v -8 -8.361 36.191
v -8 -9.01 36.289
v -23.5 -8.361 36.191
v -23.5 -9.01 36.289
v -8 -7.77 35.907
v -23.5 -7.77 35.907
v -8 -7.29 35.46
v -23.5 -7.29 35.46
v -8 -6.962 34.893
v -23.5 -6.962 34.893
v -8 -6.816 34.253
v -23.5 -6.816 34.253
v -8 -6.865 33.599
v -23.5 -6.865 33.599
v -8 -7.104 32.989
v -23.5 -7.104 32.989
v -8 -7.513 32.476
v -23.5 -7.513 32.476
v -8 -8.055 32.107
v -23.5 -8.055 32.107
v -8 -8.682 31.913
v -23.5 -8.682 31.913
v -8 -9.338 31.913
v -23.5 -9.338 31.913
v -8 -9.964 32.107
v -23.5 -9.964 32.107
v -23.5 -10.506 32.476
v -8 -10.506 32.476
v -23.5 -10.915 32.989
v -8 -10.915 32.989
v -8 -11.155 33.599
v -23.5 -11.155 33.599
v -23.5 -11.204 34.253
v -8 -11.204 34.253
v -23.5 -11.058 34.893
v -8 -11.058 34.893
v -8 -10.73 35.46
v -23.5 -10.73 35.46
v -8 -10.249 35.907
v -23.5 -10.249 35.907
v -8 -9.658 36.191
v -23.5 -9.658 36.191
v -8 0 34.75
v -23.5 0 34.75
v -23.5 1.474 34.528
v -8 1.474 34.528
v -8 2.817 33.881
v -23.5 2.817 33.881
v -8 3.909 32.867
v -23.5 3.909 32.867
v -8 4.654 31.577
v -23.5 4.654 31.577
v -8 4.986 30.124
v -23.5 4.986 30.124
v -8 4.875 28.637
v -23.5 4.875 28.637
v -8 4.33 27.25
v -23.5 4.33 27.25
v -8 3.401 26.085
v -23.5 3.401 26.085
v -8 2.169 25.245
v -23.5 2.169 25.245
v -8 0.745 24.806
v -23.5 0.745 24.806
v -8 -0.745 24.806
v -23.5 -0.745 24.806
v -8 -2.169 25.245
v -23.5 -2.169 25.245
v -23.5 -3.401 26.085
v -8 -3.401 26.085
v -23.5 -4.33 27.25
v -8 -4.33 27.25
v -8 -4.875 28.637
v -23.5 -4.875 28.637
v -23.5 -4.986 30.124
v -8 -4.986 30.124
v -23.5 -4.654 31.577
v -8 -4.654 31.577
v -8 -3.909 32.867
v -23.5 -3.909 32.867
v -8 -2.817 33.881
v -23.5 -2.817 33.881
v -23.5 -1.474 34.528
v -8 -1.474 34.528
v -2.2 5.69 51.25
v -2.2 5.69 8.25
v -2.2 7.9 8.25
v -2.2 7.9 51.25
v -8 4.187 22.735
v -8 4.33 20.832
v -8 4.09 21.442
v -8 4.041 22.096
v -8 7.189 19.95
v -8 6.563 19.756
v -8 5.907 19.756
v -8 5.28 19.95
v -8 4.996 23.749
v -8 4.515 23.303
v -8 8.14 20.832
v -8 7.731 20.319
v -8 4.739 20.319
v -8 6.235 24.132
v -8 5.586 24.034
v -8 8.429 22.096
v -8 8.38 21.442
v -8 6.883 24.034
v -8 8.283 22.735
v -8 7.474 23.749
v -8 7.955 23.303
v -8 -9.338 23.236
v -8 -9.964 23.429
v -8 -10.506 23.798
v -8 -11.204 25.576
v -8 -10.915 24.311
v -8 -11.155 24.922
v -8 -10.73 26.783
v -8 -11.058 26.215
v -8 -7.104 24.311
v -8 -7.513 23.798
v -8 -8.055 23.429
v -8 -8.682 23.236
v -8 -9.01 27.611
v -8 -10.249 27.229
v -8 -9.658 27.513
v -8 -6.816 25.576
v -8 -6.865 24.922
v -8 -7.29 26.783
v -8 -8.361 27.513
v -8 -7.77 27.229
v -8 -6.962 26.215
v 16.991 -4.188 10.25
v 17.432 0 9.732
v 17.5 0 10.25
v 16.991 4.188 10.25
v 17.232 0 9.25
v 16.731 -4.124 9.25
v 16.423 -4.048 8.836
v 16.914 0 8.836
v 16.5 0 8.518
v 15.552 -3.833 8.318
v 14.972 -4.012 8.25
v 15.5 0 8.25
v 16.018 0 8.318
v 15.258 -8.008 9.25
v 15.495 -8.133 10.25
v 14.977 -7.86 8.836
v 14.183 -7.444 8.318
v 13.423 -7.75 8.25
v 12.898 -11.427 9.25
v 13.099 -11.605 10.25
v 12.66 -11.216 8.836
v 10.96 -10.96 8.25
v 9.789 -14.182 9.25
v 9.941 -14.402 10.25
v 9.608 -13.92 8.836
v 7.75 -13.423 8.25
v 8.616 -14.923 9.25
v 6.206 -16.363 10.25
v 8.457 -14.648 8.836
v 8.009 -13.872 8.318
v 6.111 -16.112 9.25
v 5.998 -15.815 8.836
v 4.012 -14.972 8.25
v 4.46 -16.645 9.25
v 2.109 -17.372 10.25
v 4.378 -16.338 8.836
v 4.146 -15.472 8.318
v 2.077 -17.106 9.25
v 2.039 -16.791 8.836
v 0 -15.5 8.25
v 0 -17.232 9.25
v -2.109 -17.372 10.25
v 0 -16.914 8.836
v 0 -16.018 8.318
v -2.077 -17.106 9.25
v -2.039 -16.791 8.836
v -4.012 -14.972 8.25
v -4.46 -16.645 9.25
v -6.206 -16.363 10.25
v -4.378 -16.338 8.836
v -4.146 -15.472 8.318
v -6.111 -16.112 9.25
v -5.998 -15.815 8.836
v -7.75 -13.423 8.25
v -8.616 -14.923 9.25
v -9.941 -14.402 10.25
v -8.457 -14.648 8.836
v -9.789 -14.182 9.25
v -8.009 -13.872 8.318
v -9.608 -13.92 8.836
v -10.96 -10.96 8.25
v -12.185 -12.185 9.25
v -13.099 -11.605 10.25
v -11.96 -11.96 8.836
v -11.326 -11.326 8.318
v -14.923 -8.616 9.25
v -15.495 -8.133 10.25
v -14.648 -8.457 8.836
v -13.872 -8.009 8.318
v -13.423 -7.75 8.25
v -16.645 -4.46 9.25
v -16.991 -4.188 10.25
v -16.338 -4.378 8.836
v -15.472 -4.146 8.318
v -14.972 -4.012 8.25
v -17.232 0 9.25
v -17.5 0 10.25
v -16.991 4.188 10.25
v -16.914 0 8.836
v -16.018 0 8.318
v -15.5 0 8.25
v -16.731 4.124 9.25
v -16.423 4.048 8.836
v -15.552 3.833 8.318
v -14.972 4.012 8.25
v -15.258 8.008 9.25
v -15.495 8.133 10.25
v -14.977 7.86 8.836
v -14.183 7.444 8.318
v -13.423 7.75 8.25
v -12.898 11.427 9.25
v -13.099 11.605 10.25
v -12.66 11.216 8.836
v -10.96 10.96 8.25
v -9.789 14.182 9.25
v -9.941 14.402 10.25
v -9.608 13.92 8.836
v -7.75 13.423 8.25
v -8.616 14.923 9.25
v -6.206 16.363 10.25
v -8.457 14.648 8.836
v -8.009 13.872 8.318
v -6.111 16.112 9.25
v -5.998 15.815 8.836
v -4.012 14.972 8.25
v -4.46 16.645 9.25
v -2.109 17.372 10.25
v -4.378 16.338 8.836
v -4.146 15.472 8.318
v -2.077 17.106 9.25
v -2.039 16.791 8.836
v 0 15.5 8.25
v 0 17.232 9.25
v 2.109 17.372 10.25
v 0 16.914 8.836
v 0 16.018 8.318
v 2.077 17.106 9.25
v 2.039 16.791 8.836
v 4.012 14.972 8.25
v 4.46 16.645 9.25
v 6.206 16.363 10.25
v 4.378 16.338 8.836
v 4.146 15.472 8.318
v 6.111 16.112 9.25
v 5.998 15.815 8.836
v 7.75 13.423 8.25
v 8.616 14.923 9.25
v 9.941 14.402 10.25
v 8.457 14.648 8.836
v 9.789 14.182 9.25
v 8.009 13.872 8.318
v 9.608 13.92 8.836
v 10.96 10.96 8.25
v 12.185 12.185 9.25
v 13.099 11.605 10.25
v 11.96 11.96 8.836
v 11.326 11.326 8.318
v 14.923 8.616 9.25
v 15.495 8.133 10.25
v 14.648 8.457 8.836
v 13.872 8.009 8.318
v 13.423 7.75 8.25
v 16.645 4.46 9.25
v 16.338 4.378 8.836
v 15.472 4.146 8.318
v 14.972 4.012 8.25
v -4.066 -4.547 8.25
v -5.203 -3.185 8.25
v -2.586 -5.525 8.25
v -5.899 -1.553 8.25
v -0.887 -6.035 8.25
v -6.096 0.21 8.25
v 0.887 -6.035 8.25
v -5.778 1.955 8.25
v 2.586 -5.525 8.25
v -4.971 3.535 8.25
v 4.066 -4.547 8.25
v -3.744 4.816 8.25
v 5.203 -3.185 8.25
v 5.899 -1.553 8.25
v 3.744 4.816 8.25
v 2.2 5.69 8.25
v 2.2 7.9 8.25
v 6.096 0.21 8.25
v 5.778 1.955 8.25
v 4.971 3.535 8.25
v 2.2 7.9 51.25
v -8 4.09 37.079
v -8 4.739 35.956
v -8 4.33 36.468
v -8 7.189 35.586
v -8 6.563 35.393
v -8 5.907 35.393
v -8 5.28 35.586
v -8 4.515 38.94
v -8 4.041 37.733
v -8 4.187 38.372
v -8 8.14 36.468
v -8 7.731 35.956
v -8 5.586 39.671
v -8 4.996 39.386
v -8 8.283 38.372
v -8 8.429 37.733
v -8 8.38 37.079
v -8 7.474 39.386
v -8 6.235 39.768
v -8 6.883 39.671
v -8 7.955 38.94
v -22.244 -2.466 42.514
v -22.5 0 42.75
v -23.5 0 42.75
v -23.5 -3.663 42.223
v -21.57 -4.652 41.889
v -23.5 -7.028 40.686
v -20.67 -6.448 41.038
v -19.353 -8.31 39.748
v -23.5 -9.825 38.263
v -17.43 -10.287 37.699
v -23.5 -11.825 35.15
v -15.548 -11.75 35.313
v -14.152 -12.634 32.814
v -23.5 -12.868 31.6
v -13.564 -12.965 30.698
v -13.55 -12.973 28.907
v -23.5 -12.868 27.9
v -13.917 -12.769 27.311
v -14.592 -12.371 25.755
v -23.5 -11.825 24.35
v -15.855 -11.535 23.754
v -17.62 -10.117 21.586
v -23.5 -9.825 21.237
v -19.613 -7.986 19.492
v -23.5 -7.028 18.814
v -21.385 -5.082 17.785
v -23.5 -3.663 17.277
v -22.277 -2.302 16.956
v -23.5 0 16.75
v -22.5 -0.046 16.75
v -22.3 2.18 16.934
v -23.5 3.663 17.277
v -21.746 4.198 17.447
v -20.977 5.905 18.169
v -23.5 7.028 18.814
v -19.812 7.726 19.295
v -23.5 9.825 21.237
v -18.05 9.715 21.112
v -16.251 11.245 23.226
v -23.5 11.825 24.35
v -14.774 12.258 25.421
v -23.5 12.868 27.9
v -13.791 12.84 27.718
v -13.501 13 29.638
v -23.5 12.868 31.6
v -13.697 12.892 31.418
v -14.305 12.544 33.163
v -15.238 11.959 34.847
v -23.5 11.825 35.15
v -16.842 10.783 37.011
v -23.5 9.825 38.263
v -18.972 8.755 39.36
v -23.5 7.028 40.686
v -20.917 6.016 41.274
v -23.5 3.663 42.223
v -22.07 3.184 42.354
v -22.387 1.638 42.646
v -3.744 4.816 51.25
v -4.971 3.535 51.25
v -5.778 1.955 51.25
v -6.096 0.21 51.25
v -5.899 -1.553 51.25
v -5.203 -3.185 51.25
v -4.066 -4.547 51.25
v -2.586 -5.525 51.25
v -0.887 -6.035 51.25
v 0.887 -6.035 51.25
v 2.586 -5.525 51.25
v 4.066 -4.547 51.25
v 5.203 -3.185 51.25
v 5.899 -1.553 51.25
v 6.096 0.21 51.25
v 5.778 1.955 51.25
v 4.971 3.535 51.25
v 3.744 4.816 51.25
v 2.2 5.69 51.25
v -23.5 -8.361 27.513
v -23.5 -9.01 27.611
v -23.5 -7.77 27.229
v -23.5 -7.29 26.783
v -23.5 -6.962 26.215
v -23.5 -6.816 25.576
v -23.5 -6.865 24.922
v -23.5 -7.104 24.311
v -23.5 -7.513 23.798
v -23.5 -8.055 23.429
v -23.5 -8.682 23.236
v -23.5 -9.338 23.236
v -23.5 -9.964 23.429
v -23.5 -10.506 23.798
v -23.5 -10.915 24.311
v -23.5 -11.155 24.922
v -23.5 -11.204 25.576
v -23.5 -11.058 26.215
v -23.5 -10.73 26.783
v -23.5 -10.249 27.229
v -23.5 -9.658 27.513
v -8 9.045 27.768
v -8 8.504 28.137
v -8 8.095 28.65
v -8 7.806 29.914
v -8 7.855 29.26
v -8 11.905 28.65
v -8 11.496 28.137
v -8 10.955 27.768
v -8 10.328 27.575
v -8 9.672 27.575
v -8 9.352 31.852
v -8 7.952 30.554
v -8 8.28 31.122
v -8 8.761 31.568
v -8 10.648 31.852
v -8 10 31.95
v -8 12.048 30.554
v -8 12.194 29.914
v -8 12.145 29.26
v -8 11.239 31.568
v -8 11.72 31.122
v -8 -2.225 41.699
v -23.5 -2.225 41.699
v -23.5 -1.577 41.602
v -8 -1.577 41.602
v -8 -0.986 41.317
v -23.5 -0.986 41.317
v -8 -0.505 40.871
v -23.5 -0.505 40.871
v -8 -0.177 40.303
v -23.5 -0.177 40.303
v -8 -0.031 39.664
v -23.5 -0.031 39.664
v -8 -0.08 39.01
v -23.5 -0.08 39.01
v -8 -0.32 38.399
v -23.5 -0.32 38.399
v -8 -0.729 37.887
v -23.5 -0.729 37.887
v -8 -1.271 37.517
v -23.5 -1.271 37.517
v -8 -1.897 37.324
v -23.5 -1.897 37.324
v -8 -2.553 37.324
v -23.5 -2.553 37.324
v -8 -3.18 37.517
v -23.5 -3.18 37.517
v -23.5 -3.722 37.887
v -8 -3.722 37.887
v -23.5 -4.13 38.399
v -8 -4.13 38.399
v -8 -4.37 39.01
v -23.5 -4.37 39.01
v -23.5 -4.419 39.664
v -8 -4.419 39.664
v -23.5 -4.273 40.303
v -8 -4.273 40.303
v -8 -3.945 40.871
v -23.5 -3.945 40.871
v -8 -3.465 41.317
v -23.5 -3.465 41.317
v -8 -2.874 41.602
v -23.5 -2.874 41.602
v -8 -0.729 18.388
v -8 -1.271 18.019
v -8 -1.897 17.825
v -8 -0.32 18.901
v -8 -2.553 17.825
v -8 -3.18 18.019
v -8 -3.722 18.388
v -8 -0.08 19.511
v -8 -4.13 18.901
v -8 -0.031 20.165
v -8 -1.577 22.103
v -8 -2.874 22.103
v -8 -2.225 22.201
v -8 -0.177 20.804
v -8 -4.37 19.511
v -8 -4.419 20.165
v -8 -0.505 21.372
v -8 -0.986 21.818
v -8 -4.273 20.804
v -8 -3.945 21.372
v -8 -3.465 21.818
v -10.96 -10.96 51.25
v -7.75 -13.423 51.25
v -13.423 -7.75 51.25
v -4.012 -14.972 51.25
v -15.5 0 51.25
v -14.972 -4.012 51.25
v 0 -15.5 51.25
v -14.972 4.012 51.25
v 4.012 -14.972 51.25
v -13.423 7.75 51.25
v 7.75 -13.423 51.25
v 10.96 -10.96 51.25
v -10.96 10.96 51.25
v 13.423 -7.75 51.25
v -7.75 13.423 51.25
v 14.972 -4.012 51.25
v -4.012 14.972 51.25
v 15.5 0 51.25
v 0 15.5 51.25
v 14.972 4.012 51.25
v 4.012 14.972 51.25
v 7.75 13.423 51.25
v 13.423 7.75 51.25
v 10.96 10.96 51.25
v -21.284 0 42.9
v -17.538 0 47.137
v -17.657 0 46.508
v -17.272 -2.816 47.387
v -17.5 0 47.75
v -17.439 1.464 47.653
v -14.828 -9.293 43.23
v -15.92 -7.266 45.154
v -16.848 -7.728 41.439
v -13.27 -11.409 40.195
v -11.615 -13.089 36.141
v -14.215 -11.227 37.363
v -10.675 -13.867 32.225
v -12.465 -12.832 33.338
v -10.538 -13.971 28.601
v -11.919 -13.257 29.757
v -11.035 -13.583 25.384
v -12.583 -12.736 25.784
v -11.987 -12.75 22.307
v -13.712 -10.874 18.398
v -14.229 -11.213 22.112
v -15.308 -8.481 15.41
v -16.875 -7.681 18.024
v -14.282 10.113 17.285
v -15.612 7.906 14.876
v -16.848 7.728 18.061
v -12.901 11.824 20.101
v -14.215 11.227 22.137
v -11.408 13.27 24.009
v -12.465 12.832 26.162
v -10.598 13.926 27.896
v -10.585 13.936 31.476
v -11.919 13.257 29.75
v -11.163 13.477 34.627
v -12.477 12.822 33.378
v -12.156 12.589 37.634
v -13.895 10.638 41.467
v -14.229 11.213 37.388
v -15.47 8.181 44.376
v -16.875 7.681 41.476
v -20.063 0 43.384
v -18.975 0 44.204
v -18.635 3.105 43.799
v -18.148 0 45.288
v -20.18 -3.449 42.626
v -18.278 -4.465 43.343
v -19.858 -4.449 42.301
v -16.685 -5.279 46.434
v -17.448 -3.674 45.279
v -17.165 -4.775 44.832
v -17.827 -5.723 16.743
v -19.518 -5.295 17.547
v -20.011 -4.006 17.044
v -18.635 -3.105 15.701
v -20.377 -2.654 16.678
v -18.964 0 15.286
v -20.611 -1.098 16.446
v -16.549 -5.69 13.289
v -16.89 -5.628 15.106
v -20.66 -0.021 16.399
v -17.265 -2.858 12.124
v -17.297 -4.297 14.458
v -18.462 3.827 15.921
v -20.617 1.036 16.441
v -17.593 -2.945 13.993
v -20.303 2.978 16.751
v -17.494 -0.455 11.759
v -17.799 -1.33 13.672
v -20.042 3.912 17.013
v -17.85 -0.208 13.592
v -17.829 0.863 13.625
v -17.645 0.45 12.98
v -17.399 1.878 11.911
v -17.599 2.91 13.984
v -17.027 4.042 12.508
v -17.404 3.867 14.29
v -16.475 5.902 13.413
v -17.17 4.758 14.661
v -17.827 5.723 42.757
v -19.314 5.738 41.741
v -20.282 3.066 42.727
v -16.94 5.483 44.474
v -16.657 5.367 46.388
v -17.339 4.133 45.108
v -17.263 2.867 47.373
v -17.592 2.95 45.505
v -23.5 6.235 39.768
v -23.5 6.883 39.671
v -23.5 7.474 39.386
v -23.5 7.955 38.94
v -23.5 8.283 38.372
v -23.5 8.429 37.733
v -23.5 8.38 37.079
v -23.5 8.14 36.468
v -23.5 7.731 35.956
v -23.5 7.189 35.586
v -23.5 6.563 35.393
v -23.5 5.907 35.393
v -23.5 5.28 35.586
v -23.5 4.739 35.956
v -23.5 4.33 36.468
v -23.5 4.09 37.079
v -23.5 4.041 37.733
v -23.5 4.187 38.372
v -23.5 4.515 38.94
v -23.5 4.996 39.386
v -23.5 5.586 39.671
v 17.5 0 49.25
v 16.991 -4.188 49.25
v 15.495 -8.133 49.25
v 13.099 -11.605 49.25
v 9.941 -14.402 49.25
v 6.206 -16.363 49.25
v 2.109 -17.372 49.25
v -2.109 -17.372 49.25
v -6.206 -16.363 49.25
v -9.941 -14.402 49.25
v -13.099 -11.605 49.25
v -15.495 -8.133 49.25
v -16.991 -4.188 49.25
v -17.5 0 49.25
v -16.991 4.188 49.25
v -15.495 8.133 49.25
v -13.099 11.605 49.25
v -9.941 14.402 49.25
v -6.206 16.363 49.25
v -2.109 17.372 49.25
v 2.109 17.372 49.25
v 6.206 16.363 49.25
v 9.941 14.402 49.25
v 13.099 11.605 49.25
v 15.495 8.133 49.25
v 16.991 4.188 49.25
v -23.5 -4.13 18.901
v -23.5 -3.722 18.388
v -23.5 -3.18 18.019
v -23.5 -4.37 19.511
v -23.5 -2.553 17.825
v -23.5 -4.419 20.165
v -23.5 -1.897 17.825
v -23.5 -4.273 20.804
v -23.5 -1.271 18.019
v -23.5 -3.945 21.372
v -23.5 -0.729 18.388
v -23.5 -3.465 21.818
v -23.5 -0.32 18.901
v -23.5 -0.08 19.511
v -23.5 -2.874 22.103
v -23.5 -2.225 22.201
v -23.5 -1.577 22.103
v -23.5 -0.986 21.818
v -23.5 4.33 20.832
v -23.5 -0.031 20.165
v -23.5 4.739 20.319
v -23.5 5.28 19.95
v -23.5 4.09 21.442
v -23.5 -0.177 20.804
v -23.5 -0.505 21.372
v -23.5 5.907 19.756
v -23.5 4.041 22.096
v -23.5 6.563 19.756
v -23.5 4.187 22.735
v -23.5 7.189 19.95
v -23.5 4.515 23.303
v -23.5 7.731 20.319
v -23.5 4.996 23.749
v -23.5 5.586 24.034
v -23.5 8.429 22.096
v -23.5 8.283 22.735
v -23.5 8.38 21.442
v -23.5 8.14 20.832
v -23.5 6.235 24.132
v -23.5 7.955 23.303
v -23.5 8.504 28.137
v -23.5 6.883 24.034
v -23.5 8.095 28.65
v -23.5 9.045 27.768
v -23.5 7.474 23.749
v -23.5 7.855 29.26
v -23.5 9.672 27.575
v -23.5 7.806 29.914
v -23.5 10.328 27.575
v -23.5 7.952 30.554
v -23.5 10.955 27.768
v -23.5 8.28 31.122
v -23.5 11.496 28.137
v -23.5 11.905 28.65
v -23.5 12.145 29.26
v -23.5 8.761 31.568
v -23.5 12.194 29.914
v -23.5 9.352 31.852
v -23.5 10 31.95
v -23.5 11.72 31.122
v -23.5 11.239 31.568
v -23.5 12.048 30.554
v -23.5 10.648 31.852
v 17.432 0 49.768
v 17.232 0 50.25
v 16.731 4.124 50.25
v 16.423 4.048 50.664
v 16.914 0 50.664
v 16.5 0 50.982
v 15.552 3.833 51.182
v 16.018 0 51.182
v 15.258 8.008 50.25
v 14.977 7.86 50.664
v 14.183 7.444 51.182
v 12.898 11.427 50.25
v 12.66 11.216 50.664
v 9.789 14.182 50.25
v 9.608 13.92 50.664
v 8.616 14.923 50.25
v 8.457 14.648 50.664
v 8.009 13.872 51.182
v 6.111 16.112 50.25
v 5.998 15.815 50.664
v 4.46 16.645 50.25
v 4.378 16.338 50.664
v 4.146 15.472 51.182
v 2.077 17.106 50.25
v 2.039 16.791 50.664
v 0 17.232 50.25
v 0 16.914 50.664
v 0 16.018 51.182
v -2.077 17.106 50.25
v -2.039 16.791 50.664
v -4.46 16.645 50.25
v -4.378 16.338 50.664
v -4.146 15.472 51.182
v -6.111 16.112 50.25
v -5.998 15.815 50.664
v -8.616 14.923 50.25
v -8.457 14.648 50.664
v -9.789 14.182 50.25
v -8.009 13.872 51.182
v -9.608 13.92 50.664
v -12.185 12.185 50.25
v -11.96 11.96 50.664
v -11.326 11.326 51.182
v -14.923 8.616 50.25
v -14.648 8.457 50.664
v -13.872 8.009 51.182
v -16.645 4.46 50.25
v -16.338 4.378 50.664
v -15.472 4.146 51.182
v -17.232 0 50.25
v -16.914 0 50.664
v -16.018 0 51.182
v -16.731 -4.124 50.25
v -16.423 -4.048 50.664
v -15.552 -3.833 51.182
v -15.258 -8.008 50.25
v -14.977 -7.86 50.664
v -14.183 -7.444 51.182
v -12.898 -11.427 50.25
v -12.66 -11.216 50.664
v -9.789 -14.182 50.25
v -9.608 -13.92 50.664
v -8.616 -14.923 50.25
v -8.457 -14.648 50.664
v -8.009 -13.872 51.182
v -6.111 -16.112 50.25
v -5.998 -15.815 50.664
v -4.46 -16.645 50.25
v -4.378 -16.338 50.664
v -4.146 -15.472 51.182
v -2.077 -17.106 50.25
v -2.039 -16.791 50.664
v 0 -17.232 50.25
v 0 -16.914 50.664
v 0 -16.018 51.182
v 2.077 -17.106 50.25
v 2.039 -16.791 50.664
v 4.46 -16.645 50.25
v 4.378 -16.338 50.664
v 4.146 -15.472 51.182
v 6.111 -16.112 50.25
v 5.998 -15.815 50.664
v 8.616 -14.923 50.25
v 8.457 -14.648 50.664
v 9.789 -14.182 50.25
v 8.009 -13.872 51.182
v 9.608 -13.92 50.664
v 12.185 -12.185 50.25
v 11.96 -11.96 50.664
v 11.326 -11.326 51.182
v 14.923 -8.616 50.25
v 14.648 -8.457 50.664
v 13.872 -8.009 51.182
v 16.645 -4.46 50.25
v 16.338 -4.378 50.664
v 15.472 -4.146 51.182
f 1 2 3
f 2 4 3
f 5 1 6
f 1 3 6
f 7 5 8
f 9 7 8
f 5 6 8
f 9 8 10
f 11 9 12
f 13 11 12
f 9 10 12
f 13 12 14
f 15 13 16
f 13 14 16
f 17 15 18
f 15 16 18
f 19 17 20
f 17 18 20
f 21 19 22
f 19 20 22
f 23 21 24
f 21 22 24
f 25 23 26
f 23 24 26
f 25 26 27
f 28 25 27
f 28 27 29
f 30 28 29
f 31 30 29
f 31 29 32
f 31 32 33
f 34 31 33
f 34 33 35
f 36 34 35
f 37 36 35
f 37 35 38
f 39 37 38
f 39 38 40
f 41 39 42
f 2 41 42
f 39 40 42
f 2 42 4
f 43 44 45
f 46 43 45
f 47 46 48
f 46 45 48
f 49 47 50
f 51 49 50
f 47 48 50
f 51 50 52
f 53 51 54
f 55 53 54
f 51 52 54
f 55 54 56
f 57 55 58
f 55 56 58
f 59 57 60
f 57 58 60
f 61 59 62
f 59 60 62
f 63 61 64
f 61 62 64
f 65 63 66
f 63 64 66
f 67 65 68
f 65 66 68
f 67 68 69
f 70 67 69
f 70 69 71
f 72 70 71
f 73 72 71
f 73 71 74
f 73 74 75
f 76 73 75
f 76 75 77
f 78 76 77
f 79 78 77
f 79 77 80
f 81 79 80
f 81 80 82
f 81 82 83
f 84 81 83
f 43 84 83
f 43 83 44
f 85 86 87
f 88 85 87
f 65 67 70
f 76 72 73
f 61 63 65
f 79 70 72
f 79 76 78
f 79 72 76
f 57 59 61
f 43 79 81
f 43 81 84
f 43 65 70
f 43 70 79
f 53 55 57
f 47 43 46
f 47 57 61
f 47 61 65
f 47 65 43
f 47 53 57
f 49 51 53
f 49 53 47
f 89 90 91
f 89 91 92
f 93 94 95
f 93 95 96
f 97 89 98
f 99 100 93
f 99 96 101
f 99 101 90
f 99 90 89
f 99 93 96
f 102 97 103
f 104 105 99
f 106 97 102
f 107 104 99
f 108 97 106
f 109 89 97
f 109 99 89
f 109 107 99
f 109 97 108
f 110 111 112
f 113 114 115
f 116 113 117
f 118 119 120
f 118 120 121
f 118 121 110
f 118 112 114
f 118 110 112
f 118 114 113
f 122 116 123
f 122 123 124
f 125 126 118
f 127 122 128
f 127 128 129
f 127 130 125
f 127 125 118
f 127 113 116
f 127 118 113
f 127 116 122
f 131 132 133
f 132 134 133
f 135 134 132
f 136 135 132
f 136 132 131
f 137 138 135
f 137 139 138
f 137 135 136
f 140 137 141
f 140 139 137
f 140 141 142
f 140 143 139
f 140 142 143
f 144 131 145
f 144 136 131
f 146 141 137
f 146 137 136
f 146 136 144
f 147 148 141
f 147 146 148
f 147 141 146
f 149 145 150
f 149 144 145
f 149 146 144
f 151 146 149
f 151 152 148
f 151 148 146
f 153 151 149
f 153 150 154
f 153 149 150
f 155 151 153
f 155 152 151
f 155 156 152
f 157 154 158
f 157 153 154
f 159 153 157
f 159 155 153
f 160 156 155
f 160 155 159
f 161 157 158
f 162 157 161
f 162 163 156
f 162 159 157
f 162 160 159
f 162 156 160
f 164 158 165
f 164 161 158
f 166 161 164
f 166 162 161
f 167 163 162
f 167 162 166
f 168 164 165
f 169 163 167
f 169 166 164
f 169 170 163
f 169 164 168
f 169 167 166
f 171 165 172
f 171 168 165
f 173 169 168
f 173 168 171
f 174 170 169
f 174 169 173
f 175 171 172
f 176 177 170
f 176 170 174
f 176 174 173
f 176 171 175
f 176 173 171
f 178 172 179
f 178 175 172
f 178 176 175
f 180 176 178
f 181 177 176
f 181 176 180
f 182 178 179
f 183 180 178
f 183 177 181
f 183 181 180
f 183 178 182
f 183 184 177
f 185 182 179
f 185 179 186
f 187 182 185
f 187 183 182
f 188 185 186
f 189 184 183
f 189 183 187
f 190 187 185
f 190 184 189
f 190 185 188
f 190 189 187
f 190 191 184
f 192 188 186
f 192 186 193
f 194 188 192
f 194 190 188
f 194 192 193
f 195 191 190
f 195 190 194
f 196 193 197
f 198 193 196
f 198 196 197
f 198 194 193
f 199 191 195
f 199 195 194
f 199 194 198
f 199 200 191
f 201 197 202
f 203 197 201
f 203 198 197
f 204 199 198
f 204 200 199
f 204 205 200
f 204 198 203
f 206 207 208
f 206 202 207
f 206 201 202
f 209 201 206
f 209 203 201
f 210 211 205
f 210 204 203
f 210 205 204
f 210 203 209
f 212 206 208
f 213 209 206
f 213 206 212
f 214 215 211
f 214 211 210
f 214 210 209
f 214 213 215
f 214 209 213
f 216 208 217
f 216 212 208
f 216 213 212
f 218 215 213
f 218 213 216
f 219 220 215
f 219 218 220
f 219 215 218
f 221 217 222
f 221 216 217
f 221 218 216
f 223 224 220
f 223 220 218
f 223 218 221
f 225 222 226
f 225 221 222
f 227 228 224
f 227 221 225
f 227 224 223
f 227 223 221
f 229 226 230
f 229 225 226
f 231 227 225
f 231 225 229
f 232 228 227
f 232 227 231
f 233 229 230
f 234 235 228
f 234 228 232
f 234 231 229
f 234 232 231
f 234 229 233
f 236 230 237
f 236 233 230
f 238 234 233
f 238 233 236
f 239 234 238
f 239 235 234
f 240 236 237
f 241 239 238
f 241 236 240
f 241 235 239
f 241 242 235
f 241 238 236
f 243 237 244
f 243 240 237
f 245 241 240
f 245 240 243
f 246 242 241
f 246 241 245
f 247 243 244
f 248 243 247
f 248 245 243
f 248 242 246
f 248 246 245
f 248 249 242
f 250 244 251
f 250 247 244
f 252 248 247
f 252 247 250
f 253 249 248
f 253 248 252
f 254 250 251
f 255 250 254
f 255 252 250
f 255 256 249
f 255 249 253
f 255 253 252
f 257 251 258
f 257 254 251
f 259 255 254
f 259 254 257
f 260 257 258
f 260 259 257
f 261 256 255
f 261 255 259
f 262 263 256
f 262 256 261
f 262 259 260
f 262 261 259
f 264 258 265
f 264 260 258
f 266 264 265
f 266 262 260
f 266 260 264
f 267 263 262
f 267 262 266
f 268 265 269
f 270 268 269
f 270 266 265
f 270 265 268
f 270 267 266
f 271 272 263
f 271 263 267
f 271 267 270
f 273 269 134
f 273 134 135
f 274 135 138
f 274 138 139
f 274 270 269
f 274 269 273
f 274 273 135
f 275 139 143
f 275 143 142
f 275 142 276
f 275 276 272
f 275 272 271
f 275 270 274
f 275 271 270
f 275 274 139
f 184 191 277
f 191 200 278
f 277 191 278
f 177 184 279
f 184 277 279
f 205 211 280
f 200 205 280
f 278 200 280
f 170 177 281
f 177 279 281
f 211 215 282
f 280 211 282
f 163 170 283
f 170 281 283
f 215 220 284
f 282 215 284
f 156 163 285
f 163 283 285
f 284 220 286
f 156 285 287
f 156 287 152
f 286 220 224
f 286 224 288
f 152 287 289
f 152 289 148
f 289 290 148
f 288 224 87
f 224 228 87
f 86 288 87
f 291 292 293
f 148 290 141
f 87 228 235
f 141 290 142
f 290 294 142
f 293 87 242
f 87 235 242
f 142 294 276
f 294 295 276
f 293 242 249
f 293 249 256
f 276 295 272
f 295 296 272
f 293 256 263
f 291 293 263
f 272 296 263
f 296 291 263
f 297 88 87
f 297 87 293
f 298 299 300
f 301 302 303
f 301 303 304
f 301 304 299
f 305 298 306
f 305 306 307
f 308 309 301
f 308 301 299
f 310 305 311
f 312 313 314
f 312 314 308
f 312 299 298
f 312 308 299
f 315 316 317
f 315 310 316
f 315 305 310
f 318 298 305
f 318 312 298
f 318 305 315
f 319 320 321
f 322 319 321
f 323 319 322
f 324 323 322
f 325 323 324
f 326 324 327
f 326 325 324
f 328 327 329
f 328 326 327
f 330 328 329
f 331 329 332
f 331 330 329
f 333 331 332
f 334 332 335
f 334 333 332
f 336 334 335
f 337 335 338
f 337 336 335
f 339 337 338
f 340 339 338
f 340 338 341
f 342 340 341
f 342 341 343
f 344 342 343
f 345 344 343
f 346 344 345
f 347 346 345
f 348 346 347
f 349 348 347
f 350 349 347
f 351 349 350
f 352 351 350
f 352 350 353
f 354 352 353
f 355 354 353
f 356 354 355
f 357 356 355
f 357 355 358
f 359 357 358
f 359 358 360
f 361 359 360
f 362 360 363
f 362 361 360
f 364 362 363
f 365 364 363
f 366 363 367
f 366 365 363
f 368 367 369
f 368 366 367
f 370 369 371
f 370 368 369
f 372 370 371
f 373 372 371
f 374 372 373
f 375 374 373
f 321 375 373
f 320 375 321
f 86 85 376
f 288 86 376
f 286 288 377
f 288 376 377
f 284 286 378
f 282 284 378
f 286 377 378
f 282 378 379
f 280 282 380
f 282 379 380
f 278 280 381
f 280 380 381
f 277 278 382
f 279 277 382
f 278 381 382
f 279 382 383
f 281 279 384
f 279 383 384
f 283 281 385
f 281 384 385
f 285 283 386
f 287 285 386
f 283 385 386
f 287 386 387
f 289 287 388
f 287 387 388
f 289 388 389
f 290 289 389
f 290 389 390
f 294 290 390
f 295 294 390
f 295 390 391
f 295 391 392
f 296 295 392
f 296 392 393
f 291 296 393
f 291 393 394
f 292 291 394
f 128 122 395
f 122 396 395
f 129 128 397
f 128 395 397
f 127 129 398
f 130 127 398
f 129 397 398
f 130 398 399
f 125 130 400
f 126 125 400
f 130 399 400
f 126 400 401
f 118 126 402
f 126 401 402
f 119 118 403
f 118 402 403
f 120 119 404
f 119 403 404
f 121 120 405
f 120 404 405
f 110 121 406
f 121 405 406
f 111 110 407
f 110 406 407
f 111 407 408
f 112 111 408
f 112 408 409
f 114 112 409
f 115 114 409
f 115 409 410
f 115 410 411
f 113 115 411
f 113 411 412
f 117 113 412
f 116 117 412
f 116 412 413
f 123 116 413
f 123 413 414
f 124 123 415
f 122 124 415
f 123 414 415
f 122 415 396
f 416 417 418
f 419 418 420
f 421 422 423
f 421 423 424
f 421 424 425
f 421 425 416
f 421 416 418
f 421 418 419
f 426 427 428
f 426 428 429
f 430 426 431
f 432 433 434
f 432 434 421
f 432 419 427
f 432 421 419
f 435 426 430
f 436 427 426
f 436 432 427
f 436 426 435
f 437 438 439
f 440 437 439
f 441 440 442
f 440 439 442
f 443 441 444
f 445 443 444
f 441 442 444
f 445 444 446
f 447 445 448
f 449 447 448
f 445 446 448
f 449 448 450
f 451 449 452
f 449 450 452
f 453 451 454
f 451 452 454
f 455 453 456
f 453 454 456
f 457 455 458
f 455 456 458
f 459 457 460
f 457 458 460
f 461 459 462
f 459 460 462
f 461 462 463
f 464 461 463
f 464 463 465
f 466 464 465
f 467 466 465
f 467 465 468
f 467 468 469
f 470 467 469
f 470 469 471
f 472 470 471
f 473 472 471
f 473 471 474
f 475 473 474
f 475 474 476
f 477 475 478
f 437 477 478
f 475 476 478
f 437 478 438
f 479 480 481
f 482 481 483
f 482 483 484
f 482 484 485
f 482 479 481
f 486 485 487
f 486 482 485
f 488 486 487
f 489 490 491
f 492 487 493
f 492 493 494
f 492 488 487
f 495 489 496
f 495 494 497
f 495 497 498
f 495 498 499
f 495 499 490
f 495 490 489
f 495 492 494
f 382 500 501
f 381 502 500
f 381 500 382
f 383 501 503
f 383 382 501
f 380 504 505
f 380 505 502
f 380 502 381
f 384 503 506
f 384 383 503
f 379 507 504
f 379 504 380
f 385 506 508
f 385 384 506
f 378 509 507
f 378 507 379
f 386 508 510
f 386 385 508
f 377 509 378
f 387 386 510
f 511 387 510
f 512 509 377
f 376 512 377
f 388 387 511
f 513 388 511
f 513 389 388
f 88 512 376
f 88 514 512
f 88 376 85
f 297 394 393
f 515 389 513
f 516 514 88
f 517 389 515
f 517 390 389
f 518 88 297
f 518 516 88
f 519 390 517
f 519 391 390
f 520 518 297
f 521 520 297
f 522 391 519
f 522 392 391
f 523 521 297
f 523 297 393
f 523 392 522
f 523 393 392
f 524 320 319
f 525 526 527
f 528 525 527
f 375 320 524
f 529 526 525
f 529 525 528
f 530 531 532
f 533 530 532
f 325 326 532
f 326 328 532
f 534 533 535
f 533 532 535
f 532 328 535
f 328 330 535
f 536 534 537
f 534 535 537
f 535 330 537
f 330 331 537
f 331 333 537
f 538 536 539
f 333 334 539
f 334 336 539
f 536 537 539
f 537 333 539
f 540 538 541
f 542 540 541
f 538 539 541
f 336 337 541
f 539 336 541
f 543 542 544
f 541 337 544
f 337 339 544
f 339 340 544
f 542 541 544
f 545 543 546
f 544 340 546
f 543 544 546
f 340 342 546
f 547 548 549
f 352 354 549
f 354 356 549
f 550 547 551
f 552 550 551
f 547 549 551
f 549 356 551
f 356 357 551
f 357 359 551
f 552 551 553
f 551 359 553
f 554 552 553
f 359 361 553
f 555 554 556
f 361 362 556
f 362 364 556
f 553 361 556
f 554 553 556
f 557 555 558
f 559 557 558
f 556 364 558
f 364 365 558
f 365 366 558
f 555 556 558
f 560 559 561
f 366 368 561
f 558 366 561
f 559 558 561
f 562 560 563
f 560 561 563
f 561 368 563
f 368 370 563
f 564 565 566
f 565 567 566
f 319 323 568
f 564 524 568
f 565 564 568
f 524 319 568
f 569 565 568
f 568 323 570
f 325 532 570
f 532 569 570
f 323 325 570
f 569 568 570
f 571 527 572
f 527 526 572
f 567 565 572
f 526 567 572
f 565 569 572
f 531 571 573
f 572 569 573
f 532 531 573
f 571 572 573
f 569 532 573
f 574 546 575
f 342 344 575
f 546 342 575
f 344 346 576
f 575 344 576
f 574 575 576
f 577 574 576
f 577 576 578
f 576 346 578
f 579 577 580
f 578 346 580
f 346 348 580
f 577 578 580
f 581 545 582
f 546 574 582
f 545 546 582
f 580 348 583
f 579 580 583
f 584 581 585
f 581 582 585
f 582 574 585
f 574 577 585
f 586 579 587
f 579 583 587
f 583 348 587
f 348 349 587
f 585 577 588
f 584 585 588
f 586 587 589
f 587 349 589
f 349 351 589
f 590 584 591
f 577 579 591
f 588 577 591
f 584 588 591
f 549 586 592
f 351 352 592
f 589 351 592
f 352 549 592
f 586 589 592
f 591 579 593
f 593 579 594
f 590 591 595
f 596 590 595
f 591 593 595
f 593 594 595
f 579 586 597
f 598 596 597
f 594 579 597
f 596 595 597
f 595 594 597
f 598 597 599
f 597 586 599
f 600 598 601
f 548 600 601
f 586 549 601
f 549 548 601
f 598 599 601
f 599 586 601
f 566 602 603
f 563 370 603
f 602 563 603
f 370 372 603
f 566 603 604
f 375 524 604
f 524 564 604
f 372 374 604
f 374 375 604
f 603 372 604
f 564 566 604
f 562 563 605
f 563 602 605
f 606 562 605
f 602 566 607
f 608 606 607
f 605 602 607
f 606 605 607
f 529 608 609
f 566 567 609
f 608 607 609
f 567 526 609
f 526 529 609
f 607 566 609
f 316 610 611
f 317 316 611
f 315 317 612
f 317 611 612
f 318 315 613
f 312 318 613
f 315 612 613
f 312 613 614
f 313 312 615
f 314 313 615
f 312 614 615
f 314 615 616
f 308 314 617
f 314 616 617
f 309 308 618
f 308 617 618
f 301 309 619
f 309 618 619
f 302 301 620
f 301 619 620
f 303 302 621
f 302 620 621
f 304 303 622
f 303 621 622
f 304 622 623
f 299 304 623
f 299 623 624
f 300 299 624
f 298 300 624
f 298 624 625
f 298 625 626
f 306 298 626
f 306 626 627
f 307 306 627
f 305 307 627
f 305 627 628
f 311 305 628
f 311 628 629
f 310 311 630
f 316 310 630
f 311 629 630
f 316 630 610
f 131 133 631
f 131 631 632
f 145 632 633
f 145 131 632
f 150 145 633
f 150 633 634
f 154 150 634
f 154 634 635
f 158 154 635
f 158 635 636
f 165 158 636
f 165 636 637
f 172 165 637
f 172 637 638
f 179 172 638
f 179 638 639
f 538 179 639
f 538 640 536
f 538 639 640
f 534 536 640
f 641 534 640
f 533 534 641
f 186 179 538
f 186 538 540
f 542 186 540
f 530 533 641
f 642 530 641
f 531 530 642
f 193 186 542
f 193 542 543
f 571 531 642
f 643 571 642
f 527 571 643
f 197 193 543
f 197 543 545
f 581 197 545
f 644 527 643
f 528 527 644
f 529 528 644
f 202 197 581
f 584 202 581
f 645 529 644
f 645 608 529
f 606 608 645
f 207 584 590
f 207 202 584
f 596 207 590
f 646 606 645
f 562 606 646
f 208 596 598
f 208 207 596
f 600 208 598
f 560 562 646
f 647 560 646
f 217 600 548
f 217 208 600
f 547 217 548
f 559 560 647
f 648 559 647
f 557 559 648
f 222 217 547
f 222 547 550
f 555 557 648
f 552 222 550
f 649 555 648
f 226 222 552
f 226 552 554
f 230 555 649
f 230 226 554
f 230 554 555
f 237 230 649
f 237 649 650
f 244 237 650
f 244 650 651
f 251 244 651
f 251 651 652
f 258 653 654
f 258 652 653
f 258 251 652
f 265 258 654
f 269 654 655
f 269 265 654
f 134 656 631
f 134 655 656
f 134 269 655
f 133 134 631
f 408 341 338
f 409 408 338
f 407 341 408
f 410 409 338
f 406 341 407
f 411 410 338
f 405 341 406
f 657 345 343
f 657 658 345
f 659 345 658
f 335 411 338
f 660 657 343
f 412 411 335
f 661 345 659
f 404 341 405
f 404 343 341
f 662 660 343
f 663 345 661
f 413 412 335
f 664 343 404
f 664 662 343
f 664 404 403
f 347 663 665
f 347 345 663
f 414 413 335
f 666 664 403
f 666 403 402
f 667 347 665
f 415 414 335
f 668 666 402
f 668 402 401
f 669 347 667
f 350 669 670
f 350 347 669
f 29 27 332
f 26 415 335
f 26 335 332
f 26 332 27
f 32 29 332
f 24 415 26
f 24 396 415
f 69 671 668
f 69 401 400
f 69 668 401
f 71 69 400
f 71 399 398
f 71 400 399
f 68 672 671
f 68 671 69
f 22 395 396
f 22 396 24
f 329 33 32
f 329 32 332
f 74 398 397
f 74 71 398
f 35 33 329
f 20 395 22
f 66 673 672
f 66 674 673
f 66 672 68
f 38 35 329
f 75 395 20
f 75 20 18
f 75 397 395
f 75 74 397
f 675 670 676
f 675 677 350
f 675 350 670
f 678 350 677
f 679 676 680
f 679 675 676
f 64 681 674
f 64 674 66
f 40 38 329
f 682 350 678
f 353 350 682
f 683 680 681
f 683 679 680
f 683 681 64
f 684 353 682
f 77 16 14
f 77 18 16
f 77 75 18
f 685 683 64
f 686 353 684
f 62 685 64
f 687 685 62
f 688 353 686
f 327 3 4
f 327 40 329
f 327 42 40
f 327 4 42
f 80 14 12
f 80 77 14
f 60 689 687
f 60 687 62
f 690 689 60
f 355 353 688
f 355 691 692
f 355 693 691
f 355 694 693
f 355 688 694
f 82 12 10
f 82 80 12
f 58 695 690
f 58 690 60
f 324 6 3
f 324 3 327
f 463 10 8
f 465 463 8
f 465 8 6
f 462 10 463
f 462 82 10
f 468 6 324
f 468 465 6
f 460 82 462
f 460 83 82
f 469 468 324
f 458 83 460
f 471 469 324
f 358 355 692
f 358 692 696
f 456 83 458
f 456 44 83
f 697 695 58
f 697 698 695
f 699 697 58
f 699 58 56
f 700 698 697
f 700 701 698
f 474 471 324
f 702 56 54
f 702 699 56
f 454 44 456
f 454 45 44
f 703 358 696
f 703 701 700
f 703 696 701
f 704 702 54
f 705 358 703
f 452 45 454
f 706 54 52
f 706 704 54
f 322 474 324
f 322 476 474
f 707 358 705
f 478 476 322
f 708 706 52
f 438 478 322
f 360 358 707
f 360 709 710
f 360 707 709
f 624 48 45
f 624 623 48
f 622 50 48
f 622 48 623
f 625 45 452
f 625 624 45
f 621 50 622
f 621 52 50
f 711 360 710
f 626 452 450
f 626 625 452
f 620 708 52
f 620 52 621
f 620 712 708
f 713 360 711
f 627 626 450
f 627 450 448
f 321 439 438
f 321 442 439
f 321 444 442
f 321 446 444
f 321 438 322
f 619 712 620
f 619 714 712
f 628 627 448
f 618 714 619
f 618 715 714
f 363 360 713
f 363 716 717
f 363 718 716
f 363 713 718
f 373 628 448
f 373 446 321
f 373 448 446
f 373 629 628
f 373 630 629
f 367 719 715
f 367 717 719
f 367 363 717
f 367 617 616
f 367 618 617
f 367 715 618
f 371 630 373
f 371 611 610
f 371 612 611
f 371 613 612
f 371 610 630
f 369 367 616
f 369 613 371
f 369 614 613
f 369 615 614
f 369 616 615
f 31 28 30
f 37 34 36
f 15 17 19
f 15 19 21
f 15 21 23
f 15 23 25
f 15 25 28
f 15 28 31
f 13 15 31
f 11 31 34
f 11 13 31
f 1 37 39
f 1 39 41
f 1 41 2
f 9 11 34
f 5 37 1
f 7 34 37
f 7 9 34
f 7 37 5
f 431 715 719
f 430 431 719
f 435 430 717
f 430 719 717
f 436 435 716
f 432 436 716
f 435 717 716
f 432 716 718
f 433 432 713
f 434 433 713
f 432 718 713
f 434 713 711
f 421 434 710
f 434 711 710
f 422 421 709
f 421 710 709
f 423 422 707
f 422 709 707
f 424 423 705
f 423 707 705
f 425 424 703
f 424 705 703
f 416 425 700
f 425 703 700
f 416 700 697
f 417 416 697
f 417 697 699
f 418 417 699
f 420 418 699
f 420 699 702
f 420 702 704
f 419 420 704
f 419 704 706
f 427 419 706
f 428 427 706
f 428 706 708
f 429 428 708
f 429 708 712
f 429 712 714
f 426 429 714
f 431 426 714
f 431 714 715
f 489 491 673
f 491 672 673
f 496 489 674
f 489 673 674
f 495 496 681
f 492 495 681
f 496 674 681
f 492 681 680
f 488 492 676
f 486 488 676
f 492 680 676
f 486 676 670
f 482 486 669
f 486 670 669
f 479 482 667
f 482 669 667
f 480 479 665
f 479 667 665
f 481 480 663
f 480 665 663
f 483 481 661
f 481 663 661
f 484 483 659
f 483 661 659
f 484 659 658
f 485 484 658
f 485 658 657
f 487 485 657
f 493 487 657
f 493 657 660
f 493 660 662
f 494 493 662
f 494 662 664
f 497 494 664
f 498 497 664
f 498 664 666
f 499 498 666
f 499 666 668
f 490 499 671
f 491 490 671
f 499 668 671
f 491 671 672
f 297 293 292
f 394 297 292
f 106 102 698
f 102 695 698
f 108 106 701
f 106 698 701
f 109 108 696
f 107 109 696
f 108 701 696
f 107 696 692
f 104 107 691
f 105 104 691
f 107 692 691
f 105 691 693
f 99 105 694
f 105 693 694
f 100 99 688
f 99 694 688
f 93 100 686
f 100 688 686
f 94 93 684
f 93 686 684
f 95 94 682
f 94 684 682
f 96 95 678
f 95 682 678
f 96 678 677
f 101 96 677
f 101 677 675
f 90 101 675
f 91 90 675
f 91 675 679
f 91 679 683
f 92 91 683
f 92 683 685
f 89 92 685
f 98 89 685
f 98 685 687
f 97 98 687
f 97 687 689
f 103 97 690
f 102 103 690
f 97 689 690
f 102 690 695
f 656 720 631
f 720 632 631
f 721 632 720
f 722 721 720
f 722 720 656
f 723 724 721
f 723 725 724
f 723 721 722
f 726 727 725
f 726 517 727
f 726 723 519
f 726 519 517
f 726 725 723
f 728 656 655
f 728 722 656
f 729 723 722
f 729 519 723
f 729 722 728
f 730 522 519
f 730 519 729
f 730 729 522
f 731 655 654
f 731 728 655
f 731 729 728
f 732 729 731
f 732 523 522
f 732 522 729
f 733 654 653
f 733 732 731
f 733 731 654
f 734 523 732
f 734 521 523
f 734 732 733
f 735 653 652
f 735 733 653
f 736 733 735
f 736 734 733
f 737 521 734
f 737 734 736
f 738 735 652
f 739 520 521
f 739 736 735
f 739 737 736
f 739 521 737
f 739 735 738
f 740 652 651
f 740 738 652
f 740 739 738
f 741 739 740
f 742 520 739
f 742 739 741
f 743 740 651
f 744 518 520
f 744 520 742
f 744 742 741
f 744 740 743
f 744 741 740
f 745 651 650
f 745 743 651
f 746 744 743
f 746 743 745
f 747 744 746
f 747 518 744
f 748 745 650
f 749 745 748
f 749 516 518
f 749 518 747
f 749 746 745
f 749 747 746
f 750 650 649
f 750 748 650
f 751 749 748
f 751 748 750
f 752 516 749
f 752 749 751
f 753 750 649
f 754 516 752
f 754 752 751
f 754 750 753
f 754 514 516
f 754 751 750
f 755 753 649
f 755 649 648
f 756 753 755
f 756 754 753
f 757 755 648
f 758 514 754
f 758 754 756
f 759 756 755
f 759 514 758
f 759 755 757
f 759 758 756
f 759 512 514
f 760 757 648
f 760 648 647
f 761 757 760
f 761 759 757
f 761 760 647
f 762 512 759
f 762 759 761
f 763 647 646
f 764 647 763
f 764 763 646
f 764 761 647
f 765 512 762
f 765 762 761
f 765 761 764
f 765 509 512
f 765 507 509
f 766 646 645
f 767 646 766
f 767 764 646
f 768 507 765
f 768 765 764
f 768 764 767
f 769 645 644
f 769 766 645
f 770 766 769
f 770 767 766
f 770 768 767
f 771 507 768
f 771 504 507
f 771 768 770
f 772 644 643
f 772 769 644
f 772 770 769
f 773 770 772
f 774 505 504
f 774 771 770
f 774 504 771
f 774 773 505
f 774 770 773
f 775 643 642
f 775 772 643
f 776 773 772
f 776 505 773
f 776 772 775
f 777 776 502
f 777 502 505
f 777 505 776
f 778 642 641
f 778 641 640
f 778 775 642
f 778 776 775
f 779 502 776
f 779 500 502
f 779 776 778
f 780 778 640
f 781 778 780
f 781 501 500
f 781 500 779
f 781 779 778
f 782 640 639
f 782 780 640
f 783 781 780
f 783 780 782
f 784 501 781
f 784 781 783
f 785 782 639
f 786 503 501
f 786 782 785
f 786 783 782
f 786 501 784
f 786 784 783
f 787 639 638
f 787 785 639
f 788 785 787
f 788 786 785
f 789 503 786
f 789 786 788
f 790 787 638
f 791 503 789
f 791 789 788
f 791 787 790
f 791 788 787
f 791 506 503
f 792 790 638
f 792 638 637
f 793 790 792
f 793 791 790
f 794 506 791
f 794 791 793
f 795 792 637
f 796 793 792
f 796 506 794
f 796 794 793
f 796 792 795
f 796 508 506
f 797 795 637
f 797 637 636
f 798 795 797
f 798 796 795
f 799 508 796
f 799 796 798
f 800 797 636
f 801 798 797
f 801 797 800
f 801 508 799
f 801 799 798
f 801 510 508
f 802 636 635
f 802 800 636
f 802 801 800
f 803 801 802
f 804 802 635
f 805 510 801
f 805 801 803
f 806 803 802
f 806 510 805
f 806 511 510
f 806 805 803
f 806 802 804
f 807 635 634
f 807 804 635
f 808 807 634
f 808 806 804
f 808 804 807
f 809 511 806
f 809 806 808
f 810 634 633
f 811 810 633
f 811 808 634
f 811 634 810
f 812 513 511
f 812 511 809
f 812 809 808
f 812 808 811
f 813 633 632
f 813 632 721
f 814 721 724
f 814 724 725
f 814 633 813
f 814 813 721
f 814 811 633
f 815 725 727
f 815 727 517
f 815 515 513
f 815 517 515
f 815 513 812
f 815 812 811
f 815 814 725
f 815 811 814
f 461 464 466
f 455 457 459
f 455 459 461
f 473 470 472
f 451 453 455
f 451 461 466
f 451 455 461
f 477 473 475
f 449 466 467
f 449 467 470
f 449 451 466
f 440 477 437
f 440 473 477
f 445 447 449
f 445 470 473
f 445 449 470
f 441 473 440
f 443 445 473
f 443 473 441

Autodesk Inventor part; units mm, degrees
ref_plane "РабПлоскость1" through (0, 0, 8.25) normal (0, 0, 1) x (1, 0, 0)
sketch "Эскиз1" plane through (0, 0, 8.25) normal (0, 0, 1) x (1, 0, 0)
  circle A0 centre (0, 0) radius 17.5
  circle A1 centre (0, 0) radius 6
  dimension "d1" = 35
  dimension "d2" = 12
extrude "Выдавливание1" add sketch "Эскиз1" along normal blind 43
ref_plane "РабПлоскость2" through (0, -17.5, 8.25) normal (0, 1, 0) x (-1, 0, 0)
ref_plane "РабПлоскость3" through (-17.5, 0, 8.25) normal (1, 0, 0) x (0, 1, 0)
sketch "Эскиз2" plane through (-17.5, 0, 8.25) normal (1, 0, 0) x (0, 1, 0)
  line L0 (17.5, 43) -> (-17.5, 43) projected
  line L1 (0, 43) -> (0, 0) construction
  line L2 (17.5, 0) -> (-17.5, 0) projected
  circle A0 centre (0, 21.5) radius 13
  point P0 (0, -8.25)
  dimension "d23" = 26
extrude "Выдавливание2" add sketch "Эскиз2" along normal up to surface
sketch "Эскиз3" plane through (-17.5, 0, 8.25) normal (-1, 0, 0) x (0, 0, 1)
  arc A0 (8.5, 0) -> (34.5, 0) centre (21.5, 0) ccw construction
  circle A1 centre (21.5, 0) radius 13
  point P0 (-8.25, 0)
  point P1 (40, 0)
  point P2 (5, 0)
  point P3 (39, 0)
  point P4 (4, 0)
  point P5 (6.5, 0)
  point P6 (36.5, 0)
extrude "Выдавливание3" add sketch "Эскиз3" along normal blind 6
fillet "Сопряжение1" radius 5 3 edges at (-11.7154, -13, 29.7735) (-14.4476, 9.875, 21.2952) (-14.4454, 9.8782, 38.201)
fillet "Сопряжение2" radius 2 2 edges at (-17.5, 0, 8.25) (-17.5, 0, 51.25)
sketch "Эскиз5" plane through (-23.5, 0, 29.75) normal (-1, 0, 0) x (0, 0, 1)
  circle A0 centre (0, 0) radius 5
  circle A1 centre (0, 0) radius 10 construction
  circle A2 centre (0, 10) radius 2.2
  circle A3 centre (-7.8183, 6.2349) radius 2.2
  circle A4 centre (-9.7493, -2.2252) radius 2.2
  circle A5 centre (-4.3388, -9.0097) radius 2.2
  circle A6 centre (4.3388, -9.0097) radius 2.2
  circle A7 centre (9.7493, -2.2252) radius 2.2
  circle A8 centre (7.8183, 6.2349) radius 2.2
  point P0 (-29.75, 0)
  dimension "d17" = 20
  dimension "d14" = 10
  dimension "d18" = 4.4
  dimension "d21" = 360
extrude "Выдавливание5" cut sketch "Эскиз5" against normal blind 15.5
sketch "Эскиз6" plane through (0, 0, 8.25) normal (0, 0, -1) x (-1, 0, 0)
  line L0 (-2.1, 2.2009) -> (2.1, 2.2009)
  line L1 (2.1, 2.2009) -> (2.1, 7.8)
  line L2 (2.1, 7.8) -> (-2.1, 7.8)
  line L3 (-2.1, 7.8) -> (-2.1, 2.2009)
  line L4 (-2.1, 2.2009) -> (2.1, 7.8) construction
  line L5 (2.1, 2.2009) -> (-2.1, 7.8) construction
  circle A0 centre (0, 0) radius 6 projected
  point P0 (0, 5.0005)
  point P1 (-2.1, 5.6205)
  point P2 (2.1, 5.6205)
  dimension "d24" = 4.2
  dimension "d25" = 7.8
extrude "Выдавливание6" cut sketch "Эскиз6" against normal through all contours L3 L2 L1 A0
sketch "Эскиз7" plane through (0, 0, 51.25) normal (0, 0, 1) x (1, 0, 0)
  arc A0 (-2.1, 5.6205) -> (2.1, 5.6205) centre (0, 0) ccw construction
  line L0 (2.1, 7.8) -> (2.1, 5.6205) construction
  line L1 (-2.1, 5.6205) -> (-2.1, 7.8) construction
  line L2 (-2.1, 7.8) -> (2.1, 7.8) construction
  arc A1 (-2.2, 5.6895) -> (2.2, 5.6895) centre (0, 0) ccw
  line L3 (-2.2, 5.6895) -> (-2.2, 7.9)
  line L4 (-2.2, 7.9) -> (2.2, 7.9)
  line L5 (2.2, 7.9) -> (2.2, 5.6895)
  dimension "d28" = 0.1
extrude "Выдавливание7" cut sketch "Эскиз7" against normal blind 56.75
properties part number "Крпеление ОУ"
